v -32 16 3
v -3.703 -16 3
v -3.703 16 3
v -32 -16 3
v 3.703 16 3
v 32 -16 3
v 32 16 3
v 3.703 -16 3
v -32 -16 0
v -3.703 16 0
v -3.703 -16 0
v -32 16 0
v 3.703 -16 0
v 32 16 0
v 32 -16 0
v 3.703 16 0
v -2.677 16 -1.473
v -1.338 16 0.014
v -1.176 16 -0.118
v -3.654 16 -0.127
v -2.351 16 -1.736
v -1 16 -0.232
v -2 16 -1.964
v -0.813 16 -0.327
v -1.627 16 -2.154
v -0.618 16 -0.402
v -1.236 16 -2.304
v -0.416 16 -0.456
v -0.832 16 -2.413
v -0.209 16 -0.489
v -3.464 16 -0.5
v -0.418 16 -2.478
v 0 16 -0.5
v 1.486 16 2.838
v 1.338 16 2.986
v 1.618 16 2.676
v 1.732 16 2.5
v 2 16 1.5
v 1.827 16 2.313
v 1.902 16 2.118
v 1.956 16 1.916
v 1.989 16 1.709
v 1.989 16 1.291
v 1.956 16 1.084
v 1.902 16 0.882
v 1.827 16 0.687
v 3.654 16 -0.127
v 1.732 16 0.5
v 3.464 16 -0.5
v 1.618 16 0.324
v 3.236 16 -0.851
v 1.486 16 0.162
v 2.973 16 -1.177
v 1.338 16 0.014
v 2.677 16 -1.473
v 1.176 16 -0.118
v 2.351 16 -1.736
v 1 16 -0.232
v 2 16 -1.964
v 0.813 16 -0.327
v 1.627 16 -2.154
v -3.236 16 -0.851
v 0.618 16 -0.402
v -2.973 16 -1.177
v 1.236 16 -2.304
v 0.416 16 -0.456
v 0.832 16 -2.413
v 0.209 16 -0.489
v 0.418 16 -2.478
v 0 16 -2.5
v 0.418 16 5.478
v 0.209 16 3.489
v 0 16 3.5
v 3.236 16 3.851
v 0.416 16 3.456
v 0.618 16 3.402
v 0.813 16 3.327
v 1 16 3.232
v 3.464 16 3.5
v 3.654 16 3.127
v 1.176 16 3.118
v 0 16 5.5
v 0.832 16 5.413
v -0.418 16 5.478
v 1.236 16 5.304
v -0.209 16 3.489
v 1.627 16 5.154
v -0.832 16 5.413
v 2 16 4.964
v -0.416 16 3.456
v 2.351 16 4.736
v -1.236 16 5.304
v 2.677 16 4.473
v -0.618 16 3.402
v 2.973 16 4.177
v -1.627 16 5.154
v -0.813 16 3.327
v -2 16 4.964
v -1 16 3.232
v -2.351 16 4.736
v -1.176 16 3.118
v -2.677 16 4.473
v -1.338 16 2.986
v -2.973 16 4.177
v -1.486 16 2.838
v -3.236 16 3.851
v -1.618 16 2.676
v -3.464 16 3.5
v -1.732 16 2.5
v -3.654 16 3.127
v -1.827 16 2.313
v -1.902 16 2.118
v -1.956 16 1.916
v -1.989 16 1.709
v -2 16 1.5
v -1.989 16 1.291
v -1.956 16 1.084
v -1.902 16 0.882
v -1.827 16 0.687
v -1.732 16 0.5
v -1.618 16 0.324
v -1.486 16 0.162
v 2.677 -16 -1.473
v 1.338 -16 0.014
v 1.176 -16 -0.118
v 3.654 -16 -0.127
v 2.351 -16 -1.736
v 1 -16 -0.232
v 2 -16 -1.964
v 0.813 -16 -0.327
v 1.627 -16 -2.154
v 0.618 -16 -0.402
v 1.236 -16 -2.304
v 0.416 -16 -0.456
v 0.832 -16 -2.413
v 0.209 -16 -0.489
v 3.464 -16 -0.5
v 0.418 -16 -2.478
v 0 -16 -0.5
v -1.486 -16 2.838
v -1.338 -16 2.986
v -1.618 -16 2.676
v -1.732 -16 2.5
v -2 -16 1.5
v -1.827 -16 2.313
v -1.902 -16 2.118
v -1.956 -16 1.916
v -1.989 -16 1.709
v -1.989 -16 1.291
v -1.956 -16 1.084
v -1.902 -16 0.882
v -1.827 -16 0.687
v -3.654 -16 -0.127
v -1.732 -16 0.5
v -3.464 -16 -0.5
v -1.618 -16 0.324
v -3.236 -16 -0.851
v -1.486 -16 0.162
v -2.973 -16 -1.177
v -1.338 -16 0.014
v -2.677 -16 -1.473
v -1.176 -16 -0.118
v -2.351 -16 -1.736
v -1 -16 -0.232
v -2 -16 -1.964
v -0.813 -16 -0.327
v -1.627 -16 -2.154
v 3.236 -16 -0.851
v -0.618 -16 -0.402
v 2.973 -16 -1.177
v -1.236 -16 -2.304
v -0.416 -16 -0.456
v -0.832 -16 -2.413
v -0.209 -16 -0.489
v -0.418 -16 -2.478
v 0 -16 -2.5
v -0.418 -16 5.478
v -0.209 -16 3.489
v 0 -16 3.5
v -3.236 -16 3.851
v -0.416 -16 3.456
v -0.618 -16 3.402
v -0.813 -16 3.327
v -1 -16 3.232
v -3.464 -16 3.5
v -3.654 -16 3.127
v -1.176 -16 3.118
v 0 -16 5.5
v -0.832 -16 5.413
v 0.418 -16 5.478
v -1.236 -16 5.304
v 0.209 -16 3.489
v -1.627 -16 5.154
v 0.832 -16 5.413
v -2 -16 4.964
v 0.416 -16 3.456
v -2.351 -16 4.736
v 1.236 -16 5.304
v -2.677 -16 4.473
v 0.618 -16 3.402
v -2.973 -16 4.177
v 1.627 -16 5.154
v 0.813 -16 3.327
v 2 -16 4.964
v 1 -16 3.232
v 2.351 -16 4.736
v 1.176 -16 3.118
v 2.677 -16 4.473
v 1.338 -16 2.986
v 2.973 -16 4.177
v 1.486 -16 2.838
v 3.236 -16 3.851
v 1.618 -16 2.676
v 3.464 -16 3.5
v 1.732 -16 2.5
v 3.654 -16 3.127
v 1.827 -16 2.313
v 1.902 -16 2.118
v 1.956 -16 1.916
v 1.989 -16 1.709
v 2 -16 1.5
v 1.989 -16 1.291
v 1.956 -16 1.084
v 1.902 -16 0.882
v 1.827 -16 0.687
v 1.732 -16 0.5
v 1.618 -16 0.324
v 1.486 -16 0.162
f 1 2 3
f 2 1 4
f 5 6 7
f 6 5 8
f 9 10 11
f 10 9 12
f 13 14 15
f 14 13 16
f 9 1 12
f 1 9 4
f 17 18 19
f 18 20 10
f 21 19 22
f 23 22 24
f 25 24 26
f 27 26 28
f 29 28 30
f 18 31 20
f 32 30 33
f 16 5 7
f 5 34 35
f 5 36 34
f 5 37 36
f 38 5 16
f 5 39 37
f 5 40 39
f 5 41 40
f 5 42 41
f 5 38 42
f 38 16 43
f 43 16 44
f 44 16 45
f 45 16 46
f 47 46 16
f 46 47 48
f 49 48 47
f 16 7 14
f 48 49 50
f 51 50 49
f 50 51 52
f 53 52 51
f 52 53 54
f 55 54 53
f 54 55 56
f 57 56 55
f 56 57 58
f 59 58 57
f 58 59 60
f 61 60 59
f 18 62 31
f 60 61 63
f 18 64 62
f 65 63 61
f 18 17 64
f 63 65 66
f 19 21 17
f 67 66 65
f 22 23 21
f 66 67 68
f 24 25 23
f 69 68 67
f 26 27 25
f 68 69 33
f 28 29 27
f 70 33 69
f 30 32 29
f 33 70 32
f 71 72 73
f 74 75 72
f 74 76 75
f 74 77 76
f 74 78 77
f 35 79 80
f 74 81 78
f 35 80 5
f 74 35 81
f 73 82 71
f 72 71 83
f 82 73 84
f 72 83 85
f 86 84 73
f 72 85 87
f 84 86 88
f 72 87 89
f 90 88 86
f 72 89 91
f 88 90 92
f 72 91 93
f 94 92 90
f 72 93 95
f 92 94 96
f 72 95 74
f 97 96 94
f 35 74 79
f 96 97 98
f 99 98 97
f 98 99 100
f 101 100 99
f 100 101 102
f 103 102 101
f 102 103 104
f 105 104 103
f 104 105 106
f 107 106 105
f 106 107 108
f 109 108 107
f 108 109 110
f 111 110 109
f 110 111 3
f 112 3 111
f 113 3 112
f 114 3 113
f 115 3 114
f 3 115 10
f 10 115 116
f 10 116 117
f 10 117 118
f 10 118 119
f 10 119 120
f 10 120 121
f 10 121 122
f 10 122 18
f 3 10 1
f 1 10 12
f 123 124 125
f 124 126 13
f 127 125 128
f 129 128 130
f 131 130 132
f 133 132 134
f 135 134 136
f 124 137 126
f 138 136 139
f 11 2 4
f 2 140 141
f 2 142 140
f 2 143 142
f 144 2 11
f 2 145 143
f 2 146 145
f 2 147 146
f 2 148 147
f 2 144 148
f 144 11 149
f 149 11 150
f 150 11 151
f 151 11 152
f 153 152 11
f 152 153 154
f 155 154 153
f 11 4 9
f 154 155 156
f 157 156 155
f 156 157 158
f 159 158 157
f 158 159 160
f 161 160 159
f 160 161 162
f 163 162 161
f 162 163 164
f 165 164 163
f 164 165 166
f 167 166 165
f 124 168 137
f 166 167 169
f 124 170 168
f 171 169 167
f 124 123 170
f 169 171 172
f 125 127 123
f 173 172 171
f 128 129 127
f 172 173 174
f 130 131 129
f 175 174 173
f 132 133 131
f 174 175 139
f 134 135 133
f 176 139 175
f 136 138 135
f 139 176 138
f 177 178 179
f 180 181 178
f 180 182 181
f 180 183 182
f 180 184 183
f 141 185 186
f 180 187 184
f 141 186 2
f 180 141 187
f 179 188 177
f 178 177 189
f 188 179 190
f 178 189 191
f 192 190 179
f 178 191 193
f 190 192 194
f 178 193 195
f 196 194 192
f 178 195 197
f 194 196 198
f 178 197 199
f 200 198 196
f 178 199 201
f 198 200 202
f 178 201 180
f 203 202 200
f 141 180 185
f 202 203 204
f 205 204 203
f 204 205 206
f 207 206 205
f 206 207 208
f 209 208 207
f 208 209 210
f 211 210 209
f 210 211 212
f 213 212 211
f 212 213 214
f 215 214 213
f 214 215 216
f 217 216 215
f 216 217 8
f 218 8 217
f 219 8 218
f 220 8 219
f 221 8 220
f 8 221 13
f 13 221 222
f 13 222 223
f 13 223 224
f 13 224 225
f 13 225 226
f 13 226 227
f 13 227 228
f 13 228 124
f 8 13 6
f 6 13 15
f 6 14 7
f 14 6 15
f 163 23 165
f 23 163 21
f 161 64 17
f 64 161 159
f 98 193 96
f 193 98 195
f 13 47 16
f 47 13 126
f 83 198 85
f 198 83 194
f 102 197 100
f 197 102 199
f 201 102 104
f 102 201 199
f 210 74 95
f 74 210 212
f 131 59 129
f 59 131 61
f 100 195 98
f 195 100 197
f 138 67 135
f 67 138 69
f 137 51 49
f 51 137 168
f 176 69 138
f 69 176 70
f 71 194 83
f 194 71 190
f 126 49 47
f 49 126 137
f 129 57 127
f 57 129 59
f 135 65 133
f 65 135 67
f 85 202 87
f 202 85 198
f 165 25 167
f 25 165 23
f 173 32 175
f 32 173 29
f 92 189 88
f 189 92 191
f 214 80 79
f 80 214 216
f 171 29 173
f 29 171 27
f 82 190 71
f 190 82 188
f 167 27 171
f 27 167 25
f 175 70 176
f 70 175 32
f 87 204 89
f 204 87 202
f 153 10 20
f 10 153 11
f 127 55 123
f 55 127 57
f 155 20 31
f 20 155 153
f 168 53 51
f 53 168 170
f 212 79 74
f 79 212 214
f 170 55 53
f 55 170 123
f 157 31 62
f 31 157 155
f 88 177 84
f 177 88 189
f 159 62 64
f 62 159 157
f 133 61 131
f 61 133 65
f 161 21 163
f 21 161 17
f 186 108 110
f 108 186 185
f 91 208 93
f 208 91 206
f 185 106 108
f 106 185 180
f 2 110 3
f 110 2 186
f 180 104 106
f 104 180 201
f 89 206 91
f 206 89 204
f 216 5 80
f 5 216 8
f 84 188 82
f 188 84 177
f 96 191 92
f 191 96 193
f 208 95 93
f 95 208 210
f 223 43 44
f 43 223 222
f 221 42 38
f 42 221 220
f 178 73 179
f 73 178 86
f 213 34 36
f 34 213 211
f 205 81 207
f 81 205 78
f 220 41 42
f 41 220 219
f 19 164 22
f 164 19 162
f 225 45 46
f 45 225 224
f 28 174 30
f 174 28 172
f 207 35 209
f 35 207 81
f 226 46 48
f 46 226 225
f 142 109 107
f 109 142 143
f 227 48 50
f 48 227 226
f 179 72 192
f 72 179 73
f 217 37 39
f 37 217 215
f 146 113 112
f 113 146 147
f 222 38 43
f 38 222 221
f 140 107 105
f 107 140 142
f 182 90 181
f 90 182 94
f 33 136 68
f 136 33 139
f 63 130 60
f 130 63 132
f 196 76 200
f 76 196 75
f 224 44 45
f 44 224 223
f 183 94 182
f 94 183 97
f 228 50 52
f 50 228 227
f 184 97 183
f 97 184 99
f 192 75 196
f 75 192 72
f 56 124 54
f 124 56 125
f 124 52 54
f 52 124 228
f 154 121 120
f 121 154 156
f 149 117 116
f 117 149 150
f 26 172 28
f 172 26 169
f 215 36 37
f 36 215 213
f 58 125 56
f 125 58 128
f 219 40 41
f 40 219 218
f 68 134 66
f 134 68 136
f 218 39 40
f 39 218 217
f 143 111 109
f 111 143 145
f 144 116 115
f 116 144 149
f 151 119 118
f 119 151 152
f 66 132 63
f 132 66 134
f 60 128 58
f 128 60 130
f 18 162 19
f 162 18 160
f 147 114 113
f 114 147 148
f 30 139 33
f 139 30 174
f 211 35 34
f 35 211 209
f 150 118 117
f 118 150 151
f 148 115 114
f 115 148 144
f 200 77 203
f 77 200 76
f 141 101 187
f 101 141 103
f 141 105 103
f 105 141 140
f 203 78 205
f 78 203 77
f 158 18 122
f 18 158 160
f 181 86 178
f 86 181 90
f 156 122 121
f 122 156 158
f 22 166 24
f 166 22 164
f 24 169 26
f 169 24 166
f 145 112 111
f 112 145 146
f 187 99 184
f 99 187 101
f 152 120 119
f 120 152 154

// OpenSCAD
// Compact plate hinge.
$fn = 60;
eps = 0.02;
leaf_l = 32;
width = 32;
pin_d = 4;
leaf_t = 3;
difference() {
    union() {
        translate([-leaf_l,-width/2,0]) cube([leaf_l,width,leaf_t]);
        translate([0,-width/2,0]) cube([leaf_l,width,leaf_t]);
        translate([0,-width/2,leaf_t/2]) rotate([-90,0,0]) cylinder(d=pin_d+4,h=width);
    }
    translate([0,-width/2-eps,leaf_t/2]) rotate([-90,0,0]) cylinder(d=pin_d,h=width+2*eps);
}
